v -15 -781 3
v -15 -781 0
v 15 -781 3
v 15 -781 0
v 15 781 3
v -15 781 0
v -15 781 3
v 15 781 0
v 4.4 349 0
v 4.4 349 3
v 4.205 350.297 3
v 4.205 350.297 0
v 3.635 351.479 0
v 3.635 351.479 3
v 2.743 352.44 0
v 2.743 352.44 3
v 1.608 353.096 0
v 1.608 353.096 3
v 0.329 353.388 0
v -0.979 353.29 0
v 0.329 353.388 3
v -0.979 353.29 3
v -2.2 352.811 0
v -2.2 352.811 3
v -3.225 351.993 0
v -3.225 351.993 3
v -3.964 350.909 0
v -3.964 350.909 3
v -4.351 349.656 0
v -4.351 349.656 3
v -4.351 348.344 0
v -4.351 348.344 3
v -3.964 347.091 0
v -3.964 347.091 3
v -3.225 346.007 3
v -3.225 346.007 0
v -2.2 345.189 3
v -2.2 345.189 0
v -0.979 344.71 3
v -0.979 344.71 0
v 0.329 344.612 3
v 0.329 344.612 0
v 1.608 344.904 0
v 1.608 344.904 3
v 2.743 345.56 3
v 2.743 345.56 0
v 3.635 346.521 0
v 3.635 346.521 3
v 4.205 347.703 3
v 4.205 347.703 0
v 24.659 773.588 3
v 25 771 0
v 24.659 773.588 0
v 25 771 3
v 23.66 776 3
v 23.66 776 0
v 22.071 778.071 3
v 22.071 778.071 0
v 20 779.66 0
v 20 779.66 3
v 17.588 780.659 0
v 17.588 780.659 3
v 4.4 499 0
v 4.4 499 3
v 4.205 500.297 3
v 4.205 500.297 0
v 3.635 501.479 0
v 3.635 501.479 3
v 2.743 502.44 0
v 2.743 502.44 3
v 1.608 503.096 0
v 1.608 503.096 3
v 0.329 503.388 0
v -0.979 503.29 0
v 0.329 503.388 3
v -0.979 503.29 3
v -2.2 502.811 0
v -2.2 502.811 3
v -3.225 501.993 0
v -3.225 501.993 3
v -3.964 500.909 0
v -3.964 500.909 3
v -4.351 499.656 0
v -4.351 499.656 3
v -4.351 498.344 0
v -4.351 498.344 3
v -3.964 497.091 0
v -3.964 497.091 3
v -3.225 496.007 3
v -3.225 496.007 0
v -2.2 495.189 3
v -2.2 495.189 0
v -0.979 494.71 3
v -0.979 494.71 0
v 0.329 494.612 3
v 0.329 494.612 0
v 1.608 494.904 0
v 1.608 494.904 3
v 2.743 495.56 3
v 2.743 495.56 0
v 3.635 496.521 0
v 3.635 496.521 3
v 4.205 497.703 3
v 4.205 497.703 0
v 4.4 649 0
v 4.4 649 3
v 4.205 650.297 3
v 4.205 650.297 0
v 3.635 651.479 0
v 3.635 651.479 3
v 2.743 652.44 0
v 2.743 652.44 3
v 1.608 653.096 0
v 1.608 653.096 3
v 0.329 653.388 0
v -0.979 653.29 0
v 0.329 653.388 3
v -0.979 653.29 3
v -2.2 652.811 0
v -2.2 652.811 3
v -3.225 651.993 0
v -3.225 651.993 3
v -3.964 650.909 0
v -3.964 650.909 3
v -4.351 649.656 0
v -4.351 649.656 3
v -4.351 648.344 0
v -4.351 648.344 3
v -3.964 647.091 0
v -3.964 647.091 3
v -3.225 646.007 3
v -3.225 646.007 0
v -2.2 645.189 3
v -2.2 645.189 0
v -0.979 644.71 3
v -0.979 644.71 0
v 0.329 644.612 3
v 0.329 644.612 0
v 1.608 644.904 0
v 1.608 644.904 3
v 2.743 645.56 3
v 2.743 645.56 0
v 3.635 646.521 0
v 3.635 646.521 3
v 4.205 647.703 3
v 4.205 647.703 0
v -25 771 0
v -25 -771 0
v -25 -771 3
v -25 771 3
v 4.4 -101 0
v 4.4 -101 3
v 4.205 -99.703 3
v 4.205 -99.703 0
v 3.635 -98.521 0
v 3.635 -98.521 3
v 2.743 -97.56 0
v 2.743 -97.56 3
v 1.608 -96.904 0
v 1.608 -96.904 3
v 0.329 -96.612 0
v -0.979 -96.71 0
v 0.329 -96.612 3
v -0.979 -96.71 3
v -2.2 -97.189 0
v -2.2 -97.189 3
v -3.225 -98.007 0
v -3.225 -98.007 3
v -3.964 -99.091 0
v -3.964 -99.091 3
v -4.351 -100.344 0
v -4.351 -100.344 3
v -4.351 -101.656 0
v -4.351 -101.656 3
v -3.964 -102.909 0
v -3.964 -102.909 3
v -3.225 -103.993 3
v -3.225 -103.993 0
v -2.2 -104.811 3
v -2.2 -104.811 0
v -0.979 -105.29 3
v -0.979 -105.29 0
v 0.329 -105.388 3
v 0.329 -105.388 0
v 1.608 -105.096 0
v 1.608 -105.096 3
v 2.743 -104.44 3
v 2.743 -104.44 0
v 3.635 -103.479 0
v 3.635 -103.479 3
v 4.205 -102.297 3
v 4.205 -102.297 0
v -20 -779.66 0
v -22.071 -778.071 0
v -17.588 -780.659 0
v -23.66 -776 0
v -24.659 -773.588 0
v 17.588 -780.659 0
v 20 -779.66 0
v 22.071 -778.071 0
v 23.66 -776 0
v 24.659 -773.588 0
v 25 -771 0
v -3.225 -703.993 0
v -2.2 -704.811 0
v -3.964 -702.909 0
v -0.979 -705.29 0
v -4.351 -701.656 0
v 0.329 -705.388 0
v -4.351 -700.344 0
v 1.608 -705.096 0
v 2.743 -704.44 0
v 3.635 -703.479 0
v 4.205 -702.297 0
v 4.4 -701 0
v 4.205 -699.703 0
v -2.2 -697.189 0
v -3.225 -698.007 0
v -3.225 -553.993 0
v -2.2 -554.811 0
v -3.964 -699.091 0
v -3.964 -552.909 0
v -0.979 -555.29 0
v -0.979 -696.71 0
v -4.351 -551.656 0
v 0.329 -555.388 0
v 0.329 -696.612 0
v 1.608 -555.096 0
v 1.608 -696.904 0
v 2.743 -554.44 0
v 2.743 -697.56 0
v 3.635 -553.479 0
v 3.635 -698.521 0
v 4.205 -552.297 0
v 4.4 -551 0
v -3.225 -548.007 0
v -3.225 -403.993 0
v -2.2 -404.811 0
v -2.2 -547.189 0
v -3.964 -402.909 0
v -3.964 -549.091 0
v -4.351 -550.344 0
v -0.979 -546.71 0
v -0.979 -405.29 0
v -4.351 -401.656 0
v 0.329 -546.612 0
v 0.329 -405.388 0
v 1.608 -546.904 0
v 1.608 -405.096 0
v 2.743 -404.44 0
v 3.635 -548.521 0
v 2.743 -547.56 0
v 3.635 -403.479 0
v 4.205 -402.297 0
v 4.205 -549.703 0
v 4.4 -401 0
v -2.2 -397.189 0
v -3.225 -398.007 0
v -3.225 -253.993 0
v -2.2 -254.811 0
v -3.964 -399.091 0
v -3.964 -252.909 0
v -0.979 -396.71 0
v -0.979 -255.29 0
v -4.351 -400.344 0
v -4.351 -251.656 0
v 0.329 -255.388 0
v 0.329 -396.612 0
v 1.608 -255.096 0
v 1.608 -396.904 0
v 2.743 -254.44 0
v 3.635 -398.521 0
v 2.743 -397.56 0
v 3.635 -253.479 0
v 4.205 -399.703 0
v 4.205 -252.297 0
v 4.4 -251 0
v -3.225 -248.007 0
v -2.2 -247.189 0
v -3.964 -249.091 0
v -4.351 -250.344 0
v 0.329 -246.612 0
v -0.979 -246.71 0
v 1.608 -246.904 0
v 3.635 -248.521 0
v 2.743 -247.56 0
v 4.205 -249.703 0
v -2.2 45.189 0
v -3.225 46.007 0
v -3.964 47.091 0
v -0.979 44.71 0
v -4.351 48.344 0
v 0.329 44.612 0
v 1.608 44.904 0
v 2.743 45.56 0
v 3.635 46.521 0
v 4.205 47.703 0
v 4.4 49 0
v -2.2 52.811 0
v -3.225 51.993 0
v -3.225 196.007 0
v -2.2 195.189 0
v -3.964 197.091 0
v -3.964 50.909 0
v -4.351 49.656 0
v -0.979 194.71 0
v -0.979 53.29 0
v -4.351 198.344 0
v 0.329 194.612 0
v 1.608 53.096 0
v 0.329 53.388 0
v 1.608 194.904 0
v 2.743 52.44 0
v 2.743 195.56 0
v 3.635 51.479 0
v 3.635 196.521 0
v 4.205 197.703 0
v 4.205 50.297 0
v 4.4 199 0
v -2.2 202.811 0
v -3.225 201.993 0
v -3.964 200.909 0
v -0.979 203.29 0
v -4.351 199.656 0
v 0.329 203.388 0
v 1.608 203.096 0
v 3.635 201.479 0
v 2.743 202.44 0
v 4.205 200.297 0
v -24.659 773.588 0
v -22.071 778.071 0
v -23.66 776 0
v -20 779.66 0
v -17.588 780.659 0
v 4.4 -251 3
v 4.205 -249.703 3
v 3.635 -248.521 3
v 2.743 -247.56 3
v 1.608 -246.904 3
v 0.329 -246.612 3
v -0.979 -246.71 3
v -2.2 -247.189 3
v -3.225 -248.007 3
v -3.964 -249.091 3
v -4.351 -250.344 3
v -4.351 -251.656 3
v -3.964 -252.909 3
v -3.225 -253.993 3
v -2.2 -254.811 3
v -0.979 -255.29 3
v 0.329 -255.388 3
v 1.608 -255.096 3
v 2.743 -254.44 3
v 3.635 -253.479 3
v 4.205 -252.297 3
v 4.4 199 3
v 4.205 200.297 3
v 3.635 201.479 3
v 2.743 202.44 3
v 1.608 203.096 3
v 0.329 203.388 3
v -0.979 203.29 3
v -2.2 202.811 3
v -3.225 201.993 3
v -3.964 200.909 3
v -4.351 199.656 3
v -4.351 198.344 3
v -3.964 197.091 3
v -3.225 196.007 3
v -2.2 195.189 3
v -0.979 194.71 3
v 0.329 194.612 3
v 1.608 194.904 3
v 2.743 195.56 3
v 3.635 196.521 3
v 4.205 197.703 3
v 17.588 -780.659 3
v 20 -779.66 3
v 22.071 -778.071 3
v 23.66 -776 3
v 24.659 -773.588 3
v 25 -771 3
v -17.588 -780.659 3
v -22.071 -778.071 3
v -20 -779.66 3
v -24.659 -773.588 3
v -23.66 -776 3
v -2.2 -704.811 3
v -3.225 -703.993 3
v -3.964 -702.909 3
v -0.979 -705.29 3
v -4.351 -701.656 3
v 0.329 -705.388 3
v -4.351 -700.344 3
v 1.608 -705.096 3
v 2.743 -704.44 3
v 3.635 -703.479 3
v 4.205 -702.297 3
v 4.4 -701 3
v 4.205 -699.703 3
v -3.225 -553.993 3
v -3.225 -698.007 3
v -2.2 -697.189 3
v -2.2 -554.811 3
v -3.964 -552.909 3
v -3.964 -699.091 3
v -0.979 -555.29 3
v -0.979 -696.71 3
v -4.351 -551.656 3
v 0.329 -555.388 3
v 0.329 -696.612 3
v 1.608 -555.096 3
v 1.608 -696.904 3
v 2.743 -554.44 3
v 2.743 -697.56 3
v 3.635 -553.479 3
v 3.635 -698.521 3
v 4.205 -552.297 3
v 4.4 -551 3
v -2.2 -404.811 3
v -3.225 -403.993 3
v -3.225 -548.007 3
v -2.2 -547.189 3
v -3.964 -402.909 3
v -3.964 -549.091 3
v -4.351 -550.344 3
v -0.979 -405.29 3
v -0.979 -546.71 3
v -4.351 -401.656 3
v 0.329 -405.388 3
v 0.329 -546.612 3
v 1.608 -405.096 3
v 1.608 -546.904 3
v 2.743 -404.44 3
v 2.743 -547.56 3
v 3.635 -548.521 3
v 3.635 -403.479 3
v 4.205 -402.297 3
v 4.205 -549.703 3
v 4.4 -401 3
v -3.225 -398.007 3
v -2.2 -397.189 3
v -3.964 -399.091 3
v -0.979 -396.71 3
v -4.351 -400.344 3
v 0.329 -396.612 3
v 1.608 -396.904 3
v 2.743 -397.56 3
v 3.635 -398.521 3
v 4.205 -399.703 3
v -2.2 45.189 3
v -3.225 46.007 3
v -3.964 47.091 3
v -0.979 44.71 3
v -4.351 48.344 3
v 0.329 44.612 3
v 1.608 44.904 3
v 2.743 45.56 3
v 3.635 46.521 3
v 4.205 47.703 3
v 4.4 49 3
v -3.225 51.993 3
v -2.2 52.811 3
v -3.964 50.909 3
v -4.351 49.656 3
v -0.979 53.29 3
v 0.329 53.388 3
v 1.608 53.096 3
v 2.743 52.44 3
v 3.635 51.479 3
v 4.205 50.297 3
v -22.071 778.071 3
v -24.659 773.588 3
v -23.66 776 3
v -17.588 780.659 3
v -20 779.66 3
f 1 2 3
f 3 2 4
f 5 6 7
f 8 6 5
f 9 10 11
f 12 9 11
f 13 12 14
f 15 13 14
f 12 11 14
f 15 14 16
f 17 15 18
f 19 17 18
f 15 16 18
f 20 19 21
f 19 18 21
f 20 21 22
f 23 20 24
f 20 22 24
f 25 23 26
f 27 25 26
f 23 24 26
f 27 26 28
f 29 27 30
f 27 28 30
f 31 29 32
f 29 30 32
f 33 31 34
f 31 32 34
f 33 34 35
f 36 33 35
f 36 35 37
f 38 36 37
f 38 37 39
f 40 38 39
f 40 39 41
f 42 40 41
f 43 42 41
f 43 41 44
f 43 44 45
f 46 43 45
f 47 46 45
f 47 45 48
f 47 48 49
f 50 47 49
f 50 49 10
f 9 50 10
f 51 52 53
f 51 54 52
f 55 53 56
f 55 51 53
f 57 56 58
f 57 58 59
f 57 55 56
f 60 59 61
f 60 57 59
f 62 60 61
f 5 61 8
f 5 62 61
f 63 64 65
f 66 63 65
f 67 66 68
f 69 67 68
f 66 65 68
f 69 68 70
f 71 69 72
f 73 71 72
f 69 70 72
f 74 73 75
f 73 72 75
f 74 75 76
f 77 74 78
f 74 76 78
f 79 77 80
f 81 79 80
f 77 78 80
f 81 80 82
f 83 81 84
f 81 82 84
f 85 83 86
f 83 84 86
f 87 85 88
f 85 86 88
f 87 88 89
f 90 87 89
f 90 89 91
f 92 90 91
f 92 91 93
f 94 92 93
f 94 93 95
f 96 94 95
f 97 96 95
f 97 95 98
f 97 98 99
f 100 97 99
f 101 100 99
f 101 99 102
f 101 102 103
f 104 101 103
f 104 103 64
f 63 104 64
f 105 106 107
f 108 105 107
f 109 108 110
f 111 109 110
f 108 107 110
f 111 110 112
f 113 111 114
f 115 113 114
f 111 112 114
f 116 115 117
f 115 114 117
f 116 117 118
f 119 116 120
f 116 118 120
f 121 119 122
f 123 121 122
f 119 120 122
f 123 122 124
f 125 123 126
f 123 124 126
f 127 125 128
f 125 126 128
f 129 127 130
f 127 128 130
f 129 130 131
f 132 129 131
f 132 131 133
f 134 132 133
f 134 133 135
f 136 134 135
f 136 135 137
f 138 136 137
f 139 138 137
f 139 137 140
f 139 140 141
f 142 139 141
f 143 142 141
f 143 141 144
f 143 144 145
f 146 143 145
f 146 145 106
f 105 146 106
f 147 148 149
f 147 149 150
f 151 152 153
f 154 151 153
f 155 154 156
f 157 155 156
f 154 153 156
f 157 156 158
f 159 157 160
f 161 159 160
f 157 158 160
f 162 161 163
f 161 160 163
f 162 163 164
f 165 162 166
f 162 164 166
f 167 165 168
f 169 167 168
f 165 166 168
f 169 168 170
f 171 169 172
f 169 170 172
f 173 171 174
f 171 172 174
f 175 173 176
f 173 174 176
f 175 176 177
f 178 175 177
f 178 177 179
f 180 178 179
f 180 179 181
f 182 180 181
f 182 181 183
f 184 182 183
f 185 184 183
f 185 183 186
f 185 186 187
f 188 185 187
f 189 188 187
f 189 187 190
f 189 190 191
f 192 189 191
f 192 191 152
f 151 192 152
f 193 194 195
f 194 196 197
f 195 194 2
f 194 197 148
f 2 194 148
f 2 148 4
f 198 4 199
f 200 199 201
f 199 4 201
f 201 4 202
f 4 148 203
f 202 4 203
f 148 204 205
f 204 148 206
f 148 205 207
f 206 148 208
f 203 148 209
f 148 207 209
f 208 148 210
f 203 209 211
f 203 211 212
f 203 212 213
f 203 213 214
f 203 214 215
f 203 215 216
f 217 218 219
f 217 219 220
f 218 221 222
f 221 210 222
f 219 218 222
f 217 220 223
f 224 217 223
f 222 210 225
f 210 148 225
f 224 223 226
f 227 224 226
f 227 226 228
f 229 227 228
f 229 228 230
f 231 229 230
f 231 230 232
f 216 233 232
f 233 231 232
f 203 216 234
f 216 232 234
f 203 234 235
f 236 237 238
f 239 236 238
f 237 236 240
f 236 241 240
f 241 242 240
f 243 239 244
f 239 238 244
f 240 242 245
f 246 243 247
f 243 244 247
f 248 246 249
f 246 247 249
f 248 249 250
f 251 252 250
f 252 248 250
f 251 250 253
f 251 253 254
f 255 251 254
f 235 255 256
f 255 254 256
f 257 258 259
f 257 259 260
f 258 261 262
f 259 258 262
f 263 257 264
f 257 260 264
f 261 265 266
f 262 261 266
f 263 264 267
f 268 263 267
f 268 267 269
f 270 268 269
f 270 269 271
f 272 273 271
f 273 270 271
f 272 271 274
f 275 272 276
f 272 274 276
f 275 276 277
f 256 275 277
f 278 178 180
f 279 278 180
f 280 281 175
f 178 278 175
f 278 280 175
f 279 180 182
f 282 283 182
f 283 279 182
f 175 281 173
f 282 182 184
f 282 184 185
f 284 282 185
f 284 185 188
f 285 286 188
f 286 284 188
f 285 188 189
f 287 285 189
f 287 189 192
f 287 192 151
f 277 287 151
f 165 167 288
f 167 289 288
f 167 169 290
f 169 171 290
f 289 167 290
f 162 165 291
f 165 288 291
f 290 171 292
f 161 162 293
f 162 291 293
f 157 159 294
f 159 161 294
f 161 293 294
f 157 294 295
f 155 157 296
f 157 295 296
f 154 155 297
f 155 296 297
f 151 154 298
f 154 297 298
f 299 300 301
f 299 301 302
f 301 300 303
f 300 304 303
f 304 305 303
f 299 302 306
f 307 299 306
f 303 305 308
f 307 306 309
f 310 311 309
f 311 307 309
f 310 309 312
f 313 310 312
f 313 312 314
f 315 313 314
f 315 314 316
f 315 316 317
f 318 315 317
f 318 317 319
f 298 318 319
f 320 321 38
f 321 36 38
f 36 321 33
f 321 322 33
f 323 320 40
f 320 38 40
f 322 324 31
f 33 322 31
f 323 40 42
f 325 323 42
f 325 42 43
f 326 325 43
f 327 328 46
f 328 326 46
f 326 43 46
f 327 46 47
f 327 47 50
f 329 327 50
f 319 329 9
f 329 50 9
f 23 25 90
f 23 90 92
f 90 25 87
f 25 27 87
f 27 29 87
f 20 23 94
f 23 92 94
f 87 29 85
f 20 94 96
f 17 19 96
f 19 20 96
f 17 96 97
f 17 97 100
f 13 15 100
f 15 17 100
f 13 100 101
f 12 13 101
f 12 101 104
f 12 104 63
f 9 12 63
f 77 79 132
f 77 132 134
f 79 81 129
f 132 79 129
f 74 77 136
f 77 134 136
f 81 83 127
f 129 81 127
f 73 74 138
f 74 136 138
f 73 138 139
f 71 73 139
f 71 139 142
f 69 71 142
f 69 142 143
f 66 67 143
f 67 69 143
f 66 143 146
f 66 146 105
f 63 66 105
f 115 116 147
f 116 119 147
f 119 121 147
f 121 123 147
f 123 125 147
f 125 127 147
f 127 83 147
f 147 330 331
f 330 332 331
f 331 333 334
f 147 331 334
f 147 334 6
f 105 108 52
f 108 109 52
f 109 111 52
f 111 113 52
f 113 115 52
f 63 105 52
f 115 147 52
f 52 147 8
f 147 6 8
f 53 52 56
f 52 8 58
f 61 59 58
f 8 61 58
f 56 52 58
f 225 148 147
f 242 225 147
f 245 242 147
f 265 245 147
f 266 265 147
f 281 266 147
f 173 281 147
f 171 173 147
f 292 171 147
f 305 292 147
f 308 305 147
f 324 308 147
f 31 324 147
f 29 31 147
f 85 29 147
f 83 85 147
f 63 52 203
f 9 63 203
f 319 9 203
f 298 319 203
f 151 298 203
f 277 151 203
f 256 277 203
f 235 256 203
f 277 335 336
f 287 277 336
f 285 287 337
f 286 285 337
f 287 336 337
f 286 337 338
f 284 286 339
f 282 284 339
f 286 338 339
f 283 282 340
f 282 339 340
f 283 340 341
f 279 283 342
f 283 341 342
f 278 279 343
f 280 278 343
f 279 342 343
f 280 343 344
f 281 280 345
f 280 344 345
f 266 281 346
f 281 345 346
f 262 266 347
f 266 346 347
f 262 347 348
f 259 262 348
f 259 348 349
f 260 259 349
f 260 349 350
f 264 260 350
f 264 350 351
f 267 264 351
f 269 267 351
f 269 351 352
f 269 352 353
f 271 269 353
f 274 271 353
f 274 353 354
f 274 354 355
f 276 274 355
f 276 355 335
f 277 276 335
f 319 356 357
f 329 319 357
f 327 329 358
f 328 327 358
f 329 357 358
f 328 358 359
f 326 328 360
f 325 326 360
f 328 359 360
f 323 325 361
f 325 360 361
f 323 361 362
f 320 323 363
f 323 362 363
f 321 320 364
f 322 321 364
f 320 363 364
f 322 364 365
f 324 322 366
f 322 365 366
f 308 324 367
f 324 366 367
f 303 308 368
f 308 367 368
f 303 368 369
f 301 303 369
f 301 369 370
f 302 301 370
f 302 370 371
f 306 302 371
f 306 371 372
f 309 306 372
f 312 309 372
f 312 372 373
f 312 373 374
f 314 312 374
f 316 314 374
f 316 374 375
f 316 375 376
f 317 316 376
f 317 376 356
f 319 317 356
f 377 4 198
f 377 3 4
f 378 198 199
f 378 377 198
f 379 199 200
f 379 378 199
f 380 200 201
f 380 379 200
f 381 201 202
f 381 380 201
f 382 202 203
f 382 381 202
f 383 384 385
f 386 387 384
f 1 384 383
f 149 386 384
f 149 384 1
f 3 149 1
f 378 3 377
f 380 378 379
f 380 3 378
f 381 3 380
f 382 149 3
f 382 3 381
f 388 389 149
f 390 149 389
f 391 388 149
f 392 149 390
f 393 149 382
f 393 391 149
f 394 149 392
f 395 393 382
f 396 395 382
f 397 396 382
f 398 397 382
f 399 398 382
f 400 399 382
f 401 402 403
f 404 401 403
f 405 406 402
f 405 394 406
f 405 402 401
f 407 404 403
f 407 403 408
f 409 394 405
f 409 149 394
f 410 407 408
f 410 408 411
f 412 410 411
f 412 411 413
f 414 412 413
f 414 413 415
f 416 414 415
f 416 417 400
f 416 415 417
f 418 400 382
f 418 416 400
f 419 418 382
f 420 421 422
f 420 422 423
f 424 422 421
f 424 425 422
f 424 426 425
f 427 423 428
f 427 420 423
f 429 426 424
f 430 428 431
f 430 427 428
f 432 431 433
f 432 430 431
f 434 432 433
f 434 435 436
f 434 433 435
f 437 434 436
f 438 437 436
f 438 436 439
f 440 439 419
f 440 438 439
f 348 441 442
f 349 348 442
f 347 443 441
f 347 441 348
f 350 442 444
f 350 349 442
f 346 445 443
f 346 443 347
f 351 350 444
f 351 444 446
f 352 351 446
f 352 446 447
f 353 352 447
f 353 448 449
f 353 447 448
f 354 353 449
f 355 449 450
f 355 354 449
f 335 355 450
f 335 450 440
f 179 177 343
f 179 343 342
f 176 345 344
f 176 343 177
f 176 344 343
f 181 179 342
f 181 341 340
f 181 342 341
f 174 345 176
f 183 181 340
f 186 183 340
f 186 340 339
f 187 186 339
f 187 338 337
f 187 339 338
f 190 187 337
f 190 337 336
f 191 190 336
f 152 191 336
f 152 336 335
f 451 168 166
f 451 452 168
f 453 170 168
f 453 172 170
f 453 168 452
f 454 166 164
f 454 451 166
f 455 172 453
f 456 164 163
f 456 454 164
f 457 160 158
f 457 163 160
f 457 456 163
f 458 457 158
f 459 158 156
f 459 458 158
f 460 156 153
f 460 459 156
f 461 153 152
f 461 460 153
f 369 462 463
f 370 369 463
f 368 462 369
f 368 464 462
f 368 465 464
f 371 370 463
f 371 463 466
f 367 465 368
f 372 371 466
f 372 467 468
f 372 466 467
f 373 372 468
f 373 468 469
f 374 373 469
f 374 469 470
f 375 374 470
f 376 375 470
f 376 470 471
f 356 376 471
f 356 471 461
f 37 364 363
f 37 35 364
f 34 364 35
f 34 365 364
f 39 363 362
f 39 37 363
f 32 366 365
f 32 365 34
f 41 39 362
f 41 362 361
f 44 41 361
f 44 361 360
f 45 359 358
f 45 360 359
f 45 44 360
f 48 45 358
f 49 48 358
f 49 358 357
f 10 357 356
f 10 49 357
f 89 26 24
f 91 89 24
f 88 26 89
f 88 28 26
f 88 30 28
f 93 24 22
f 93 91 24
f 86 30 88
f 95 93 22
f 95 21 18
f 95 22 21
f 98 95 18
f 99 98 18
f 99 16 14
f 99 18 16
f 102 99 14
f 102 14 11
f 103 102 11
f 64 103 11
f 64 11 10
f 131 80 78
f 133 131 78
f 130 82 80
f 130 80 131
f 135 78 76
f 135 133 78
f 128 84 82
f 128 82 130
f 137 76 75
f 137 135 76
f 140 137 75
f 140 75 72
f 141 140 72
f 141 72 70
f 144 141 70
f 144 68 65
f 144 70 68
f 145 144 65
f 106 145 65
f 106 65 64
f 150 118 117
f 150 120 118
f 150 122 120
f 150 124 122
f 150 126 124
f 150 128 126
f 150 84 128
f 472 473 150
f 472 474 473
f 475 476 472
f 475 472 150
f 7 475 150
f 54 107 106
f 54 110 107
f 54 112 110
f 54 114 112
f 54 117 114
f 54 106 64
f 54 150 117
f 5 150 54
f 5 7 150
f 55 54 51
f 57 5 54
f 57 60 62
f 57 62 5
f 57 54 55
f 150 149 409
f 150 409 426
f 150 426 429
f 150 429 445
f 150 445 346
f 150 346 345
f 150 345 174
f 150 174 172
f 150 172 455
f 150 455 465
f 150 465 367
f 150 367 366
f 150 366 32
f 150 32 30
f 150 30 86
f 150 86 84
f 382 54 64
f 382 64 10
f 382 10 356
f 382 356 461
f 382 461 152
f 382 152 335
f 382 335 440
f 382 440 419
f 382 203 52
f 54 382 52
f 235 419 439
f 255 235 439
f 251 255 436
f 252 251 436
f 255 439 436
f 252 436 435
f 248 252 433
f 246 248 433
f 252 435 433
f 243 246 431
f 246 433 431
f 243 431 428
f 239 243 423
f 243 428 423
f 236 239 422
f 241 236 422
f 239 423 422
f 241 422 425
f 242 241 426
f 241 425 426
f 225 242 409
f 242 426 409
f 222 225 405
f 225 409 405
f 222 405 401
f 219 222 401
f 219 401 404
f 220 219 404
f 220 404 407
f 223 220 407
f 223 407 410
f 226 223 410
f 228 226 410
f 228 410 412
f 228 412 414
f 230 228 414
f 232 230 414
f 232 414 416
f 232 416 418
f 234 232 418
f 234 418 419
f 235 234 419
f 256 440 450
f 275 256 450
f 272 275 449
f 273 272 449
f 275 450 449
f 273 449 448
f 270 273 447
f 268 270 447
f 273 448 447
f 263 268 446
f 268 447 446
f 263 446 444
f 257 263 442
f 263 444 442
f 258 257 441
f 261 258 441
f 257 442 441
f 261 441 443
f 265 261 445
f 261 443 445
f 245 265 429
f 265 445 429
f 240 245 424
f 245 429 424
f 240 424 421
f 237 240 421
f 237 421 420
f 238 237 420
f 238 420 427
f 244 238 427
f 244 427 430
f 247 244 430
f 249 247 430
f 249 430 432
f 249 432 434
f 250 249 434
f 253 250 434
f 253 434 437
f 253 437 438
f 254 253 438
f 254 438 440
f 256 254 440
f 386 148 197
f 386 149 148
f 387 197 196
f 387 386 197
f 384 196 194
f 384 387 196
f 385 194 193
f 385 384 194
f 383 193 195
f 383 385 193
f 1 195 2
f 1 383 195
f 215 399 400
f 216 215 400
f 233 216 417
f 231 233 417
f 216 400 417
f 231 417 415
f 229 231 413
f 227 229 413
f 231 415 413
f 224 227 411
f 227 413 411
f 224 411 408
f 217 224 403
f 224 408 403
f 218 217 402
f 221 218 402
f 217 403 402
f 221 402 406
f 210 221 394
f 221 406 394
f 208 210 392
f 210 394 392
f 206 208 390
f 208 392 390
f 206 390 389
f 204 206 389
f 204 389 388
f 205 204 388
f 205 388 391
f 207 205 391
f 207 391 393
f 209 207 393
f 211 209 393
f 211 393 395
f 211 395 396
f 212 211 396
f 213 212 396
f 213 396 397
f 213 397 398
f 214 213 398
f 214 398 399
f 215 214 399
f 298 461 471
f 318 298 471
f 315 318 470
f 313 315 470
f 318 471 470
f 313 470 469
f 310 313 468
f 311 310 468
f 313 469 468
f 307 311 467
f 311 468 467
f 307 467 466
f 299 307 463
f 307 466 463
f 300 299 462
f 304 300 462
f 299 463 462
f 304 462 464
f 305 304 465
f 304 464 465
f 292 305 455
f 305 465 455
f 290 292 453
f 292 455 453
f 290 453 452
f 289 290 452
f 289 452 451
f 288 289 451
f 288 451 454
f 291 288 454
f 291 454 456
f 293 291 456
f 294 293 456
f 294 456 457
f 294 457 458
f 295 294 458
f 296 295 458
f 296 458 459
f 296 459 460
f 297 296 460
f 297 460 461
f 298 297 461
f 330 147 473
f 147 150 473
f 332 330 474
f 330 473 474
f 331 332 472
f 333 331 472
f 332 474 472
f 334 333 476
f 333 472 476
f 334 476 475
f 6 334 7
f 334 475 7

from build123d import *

# Parameters (mm, degrees)
SKETCH_1_W             = 50
SKETCH_1_H             = 1562
EXTRUDE_1_DEPTH        = 3
FILLET_1_R             = 10
SKETCH_2_R             = 4.4
CUT_EXTRUDE_1_DEPTH    = 10
PATTERN_LINEAR_1_COUNT = 10
PATTERN_LINEAR_1_PITCH = 150


with BuildPart() as part:
    # Эскиз1 → Бобышка-Вытянуть1 (new body)
    with BuildSketch(Plane.XY):
        Rectangle(SKETCH_1_W, SKETCH_1_H)
    extrude(amount=EXTRUDE_1_DEPTH)

    # Скругление1
    fillet_1_edges = [part.edges().sort_by_distance(p)[0] for p in [
        (25, -781, 1.5),
        (-25, -781, 1.5),
        (-25, 781, 1.5),
        (25, 781, 1.5),
    ]]
    fillet(fillet_1_edges, radius=FILLET_1_R)

    # Эскиз2 → Вырез-Вытянуть1 (cut)
    with BuildSketch(Plane.XY.offset(3)):
        with Locations((0, -701)):
            Circle(SKETCH_2_R)
    cut_extrude_1 = extrude(amount=-CUT_EXTRUDE_1_DEPTH, mode=Mode.SUBTRACT)

    # Линейный массив1: Вырез-Вытянуть1 ×10
    with Locations(*[(0, i * PATTERN_LINEAR_1_PITCH, 0) for i in range(1, PATTERN_LINEAR_1_COUNT)]):
        add(cut_extrude_1, mode=Mode.SUBTRACT)


solid = part.part
